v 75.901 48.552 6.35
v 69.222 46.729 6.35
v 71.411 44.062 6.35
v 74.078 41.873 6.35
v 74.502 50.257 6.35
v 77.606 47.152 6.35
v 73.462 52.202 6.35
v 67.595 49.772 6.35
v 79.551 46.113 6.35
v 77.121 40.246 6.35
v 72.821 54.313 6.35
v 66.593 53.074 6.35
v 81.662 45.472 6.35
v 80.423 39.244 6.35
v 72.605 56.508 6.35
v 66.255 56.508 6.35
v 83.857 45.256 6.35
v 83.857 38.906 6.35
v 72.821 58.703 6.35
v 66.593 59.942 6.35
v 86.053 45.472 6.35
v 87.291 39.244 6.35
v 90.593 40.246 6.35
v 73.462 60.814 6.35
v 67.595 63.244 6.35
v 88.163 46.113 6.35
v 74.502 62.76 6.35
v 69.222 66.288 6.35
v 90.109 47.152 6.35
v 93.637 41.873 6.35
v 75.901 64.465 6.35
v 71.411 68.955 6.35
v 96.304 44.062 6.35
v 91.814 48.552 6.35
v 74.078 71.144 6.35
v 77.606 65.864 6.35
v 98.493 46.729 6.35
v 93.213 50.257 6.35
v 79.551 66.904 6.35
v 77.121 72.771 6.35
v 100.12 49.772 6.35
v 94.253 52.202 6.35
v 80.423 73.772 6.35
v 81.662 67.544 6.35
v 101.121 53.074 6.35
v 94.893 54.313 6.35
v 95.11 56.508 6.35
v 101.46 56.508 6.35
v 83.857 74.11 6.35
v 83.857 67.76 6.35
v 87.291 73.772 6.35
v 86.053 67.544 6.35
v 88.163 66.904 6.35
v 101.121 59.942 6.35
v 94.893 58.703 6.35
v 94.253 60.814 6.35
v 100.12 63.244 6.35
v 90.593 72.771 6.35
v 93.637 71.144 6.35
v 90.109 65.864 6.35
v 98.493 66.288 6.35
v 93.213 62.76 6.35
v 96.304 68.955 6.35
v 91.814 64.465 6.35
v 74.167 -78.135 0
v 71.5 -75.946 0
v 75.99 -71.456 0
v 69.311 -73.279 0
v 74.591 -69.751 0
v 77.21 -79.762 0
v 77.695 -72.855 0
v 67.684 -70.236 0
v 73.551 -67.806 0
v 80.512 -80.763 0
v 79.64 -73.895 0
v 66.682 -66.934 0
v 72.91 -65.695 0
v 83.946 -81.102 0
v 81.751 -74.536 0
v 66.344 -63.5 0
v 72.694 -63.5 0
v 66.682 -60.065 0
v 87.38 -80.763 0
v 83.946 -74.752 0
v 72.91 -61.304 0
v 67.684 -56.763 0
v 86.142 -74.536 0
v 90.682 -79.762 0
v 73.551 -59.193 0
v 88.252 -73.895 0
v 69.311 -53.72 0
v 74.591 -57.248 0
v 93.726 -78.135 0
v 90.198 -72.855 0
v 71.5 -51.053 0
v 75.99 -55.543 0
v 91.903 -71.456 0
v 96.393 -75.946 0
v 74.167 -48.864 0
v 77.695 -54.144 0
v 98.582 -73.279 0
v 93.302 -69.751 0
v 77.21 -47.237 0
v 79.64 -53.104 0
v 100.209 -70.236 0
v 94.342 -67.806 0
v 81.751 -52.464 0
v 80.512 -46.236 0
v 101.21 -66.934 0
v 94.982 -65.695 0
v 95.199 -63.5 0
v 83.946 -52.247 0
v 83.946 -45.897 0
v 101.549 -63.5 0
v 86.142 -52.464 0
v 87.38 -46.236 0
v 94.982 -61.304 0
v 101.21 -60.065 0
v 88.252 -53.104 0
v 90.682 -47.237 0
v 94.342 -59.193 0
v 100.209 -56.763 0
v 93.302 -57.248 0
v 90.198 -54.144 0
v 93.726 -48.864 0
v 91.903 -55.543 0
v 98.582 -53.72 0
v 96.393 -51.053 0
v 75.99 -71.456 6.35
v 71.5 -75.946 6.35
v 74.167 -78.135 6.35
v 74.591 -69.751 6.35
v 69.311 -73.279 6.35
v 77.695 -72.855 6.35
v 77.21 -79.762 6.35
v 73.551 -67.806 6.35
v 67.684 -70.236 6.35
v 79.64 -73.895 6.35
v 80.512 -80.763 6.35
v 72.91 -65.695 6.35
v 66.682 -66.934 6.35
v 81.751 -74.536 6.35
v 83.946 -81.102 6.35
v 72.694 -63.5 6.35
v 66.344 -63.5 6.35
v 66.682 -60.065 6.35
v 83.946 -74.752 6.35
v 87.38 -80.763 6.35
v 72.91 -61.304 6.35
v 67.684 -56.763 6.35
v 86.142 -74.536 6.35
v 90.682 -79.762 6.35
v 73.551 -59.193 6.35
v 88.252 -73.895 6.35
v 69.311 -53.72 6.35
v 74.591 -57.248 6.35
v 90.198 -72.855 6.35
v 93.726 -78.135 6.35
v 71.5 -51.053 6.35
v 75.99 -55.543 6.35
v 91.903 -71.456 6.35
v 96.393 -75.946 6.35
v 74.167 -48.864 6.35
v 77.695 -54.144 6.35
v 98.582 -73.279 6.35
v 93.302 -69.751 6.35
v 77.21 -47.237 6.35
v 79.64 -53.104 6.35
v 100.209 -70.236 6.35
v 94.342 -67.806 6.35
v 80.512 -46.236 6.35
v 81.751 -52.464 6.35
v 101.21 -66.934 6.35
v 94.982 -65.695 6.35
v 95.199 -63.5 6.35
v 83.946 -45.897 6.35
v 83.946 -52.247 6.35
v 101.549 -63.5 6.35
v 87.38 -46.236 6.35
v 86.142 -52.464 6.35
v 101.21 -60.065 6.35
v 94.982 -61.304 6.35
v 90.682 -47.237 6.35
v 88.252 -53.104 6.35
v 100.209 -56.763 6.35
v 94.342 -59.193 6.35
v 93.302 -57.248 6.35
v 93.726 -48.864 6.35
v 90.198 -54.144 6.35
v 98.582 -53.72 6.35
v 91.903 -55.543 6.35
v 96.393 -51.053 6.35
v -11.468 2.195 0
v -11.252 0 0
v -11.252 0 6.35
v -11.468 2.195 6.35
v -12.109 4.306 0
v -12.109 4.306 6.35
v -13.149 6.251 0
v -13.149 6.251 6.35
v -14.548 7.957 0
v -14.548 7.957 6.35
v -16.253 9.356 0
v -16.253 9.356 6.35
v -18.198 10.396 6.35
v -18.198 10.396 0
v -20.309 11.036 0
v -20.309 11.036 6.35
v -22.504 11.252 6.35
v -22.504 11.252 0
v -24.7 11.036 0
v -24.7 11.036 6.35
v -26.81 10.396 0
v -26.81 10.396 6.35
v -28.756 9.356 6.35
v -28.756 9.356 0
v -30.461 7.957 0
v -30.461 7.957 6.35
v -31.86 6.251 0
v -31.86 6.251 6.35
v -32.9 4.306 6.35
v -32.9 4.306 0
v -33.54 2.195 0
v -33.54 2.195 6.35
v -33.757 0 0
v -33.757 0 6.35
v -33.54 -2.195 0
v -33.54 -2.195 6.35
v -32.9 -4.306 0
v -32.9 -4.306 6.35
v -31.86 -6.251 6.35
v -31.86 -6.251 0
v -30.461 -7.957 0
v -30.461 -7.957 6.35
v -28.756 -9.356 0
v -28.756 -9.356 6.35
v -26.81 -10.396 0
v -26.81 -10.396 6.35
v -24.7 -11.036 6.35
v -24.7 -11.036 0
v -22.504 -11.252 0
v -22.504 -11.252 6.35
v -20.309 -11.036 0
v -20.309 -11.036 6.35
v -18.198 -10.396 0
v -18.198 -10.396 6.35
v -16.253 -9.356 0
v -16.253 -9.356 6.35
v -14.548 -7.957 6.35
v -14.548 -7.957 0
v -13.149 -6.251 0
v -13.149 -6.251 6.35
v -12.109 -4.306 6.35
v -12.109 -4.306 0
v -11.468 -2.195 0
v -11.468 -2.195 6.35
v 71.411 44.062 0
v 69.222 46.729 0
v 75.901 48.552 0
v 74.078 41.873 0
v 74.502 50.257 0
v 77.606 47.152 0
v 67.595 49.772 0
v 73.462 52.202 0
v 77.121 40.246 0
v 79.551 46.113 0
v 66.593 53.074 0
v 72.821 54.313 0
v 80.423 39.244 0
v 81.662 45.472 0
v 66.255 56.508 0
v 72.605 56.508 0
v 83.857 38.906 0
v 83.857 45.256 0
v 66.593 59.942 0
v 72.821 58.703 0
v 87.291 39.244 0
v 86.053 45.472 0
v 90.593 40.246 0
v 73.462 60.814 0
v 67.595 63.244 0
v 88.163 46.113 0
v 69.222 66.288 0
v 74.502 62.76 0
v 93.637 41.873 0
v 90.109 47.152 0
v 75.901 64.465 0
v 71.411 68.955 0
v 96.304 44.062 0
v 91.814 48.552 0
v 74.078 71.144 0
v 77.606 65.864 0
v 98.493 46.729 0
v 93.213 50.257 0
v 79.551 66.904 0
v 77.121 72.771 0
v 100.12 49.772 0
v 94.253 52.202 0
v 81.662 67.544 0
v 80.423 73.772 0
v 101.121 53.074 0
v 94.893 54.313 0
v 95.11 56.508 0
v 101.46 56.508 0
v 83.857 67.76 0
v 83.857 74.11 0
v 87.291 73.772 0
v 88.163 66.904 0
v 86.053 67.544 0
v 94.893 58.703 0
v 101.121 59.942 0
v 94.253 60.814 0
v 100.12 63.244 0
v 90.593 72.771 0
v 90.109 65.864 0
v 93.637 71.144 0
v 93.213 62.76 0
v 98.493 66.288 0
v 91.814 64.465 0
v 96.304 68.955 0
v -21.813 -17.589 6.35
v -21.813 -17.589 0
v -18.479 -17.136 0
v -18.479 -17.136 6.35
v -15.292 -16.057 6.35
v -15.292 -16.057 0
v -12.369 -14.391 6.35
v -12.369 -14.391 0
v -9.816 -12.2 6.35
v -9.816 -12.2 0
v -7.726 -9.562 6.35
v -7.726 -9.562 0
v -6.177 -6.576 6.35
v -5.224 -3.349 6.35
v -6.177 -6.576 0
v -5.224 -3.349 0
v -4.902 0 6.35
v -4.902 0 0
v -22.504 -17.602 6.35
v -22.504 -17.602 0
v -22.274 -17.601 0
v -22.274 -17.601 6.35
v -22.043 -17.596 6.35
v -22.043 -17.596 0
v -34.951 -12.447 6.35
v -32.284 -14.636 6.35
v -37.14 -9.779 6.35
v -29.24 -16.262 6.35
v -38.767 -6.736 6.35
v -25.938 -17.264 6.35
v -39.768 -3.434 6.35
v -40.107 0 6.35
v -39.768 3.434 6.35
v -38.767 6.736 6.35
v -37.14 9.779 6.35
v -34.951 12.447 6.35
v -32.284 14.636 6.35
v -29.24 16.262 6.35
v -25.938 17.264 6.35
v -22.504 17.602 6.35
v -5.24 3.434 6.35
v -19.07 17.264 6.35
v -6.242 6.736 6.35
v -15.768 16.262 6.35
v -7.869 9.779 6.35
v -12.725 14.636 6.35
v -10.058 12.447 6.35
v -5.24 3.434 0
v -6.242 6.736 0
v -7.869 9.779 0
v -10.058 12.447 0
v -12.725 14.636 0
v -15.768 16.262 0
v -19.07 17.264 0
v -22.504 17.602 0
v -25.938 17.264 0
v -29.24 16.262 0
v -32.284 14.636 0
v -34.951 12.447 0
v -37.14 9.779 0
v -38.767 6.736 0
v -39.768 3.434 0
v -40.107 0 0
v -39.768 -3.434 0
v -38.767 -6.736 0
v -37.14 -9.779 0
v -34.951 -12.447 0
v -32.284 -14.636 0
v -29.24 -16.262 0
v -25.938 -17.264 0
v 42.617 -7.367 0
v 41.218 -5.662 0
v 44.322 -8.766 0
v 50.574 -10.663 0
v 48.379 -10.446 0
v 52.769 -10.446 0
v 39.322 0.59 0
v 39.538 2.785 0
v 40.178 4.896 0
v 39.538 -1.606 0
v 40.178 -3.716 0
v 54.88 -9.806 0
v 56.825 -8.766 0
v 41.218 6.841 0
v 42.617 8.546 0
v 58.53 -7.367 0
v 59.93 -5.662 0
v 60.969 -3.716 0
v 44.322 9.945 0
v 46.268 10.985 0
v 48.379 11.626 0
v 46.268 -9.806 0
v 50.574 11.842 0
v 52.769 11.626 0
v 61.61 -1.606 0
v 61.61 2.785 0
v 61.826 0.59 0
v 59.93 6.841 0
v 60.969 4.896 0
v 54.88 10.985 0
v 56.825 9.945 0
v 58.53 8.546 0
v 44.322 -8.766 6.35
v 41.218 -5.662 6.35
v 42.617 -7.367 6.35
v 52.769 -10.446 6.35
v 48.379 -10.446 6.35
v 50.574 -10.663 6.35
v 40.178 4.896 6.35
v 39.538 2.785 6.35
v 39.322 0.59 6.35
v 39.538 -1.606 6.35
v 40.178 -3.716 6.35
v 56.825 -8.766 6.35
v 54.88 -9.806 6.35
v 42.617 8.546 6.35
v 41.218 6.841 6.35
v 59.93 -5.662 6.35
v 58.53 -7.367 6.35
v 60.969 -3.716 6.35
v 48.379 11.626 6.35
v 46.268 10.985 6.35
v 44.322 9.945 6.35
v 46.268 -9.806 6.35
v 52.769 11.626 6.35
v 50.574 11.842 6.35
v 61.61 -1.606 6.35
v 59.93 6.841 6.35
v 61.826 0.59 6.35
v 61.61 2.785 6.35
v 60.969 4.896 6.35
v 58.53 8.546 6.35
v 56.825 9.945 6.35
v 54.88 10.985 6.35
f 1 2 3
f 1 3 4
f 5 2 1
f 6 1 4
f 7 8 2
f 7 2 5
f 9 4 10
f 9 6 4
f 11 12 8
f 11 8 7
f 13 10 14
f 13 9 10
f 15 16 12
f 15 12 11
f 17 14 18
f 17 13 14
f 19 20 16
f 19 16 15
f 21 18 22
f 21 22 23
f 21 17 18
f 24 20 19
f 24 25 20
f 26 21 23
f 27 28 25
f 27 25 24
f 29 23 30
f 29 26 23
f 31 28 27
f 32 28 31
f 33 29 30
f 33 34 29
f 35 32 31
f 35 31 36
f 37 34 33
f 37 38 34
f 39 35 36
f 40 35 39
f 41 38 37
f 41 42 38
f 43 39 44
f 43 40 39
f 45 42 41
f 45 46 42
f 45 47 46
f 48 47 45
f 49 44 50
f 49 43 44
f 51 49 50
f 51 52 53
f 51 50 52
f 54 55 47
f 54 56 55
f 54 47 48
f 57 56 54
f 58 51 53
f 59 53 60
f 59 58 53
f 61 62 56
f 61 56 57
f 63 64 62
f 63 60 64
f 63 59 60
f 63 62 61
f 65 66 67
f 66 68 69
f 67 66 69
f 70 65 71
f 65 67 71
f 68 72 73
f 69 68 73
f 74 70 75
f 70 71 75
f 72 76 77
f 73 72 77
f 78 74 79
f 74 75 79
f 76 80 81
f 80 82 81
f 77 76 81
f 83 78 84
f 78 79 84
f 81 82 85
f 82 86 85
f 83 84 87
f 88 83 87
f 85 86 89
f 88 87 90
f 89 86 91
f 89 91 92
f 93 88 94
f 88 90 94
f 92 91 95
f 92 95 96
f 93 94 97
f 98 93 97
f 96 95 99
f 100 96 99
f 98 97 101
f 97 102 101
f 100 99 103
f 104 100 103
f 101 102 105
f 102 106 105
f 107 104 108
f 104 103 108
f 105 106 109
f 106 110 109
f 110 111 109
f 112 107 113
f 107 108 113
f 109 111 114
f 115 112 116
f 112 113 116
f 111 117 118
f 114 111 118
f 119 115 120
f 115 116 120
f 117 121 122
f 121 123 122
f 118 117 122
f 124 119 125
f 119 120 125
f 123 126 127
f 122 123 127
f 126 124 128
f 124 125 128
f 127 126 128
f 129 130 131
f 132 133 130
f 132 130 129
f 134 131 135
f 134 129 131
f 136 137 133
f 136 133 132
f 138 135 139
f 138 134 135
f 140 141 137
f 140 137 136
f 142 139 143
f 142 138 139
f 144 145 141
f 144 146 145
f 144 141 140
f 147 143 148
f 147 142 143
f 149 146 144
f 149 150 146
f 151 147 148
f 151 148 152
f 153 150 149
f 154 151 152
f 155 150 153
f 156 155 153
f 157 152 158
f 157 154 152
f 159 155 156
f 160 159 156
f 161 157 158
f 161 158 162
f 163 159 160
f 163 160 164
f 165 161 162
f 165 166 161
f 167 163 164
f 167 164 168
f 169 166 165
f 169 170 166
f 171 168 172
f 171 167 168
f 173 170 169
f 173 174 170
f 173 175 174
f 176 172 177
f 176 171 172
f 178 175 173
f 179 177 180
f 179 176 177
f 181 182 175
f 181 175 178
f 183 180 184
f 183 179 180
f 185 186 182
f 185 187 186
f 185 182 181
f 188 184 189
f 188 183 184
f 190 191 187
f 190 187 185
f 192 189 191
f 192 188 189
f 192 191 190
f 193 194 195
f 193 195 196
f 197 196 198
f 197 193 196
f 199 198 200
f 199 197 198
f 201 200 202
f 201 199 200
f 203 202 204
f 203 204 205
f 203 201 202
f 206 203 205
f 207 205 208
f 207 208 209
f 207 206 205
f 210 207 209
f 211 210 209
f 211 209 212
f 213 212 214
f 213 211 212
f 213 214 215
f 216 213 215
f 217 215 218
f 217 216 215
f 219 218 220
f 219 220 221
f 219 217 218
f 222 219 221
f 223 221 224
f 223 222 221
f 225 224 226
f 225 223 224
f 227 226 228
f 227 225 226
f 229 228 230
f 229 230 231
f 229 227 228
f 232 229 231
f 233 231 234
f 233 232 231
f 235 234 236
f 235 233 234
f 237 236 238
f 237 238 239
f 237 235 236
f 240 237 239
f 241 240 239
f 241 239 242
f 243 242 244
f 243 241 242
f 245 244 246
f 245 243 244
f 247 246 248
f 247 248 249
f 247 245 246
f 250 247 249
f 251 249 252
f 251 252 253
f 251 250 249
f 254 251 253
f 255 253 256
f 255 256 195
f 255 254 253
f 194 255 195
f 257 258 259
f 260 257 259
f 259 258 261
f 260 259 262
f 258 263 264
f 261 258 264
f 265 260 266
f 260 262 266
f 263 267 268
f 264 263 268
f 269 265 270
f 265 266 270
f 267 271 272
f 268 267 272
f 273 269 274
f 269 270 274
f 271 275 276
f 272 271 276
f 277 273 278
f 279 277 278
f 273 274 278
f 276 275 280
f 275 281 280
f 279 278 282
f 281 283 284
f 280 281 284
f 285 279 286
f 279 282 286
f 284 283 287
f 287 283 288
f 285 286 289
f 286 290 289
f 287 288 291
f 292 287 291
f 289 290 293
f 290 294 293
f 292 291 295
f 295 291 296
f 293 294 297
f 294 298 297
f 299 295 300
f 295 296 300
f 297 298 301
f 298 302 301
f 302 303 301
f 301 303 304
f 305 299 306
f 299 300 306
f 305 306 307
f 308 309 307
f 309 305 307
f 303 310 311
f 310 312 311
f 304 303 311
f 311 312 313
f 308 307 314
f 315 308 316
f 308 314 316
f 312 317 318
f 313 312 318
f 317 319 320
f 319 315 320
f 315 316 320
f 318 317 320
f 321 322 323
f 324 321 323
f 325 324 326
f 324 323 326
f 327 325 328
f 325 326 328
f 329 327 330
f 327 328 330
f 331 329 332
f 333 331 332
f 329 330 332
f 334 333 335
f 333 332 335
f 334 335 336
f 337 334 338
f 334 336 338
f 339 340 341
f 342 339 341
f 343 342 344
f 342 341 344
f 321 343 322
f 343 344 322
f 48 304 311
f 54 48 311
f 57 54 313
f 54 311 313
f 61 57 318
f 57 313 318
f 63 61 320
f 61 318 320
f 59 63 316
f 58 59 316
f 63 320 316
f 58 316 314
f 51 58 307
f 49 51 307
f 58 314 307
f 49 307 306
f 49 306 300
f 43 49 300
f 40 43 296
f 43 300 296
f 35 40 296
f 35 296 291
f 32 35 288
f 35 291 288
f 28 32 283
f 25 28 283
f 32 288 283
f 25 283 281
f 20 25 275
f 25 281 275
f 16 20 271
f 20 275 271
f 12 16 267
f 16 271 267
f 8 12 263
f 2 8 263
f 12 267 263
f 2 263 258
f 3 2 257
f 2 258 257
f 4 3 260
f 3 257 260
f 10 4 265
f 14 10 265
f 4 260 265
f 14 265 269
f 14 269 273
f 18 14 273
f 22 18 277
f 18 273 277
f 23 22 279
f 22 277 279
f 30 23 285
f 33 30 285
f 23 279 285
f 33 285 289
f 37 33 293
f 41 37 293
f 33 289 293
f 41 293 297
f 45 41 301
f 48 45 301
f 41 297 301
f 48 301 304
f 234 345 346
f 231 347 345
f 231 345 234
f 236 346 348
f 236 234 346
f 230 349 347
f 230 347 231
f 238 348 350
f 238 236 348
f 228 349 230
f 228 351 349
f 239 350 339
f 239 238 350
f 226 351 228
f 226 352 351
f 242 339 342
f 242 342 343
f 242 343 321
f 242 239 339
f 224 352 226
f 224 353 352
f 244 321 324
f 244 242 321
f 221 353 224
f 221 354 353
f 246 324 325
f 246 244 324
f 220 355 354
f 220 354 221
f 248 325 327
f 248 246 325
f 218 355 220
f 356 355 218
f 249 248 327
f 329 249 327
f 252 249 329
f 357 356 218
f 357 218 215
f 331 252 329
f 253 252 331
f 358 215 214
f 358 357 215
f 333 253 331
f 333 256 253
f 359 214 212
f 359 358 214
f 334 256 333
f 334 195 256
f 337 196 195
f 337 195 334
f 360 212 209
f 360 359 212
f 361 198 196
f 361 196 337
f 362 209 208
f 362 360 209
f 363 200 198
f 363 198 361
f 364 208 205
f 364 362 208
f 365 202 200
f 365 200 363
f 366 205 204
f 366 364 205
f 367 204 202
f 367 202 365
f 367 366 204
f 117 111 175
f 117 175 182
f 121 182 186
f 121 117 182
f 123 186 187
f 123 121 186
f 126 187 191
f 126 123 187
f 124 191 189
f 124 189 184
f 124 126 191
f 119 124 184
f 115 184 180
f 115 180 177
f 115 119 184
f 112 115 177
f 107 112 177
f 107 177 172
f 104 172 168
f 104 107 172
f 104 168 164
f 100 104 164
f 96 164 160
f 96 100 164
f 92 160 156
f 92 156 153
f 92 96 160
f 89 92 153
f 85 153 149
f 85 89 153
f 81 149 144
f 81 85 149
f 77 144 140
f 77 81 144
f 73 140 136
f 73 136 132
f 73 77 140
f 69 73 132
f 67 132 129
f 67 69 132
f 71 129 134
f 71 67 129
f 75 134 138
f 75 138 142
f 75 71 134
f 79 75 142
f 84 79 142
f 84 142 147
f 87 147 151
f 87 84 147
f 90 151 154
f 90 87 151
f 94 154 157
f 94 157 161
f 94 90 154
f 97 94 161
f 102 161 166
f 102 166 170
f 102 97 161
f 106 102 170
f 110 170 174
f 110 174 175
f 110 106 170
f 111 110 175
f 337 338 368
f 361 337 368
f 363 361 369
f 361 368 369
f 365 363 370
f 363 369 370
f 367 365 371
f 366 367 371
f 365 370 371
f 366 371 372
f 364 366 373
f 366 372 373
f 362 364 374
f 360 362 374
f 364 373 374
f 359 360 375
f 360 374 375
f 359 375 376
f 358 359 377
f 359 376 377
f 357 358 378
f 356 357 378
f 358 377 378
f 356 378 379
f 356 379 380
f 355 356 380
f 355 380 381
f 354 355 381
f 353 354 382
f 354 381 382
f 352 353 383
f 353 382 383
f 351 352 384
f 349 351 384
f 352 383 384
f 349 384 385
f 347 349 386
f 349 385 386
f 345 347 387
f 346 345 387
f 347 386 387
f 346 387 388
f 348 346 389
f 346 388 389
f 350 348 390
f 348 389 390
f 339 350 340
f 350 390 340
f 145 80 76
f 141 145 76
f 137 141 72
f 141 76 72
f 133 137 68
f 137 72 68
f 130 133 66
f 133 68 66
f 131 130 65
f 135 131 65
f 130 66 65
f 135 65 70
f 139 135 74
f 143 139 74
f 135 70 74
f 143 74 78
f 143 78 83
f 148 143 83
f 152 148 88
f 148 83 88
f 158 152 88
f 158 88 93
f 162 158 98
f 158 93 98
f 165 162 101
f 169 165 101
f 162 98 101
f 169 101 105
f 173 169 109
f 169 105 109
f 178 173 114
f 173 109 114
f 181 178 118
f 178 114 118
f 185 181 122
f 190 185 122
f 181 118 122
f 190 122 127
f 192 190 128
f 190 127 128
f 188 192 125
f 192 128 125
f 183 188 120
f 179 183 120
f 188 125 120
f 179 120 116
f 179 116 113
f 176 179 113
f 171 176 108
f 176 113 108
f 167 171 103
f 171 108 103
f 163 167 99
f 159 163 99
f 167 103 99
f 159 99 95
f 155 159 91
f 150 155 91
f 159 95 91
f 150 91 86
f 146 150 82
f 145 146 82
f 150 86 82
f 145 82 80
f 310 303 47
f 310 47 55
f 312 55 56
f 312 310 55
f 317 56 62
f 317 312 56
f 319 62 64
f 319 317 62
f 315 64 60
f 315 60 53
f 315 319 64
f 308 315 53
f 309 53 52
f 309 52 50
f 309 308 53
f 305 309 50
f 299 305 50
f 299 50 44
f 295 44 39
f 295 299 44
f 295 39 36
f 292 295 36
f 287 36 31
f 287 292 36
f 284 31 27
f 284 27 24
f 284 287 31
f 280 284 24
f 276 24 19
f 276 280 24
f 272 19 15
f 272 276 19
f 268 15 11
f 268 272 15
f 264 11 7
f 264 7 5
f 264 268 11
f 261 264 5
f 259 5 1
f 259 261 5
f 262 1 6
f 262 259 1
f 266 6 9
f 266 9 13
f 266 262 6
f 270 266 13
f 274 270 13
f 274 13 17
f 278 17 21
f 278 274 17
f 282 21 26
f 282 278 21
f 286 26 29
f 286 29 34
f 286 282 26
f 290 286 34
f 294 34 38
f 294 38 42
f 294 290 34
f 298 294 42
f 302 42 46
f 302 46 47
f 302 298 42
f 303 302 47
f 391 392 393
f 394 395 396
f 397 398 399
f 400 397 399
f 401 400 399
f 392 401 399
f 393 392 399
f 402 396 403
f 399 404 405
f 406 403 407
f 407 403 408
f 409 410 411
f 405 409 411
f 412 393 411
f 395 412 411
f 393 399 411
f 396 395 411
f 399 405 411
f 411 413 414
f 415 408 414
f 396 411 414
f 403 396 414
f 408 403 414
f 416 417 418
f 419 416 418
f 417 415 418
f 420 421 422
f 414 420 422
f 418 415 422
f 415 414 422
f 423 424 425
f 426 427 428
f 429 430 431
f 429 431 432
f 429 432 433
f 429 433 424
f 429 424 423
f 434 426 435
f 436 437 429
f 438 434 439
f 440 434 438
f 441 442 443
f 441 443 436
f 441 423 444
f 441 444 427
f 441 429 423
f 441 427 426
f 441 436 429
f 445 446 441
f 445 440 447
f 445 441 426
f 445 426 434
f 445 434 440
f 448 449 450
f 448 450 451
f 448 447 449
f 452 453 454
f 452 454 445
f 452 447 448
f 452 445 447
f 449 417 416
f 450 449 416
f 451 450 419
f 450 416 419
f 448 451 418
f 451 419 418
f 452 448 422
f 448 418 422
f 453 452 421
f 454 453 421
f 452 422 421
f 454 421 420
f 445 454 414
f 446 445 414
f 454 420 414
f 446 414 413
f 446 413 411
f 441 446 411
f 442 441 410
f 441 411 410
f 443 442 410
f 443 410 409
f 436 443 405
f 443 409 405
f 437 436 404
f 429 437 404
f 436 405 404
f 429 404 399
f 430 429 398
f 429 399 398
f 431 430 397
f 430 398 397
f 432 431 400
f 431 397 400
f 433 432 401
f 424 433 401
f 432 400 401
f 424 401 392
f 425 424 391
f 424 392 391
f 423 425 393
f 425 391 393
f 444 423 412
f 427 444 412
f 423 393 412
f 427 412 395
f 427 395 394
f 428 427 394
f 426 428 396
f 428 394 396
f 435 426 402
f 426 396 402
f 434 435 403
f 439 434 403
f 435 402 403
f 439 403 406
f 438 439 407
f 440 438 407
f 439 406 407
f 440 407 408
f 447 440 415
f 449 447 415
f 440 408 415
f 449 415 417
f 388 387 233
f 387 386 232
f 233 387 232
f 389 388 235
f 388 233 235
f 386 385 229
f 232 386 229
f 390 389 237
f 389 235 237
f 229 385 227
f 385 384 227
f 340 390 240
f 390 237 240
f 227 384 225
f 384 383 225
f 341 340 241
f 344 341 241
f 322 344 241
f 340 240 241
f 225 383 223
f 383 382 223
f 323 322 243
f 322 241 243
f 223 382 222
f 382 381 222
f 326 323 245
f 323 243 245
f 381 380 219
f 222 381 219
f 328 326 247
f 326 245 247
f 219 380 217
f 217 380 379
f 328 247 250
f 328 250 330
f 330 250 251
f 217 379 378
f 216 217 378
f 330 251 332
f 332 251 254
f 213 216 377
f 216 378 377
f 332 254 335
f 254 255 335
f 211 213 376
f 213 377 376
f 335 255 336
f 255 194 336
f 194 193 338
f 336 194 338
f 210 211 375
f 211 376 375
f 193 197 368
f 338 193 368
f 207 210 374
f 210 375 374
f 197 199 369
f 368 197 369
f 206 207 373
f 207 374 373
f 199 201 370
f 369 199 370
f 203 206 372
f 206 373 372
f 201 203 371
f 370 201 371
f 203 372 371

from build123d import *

# Parameters (mm, degrees)
F0_R     = 11.2522
F0_R_2   = 17.6022
F1_DEPTH = 6.35


with BuildPart() as f1:
    # F0 (on Top) → F1 (new body)
    with BuildSketch(Plane.XY):
        with Locations((50.573707, 0.589635)):
            Circle(F0_R)
        with BuildLine():
            ThreePointArc((-21.812574, -17.588599), (-9.815525, -12.199586), (-4.9022, 0))
            ThreePointArc((-4.9022, 0), (-34.951035, 12.446635), (-22.5044, -17.6022))
            ThreePointArc((-22.5044, -17.6022), (-22.158498, -17.594826), (-21.812574, -17.588599))
        make_face()
        with Locations((-22.5044, 0)):
            Circle(F0_R, mode=Mode.SUBTRACT)
        with BuildLine():
            ThreePointArc((101.548586, -63.499517), (83.946386, -45.897317), (66.344186, -63.499517))
            ThreePointArc((66.344186, -63.499517), (83.946386, -81.101717), (101.548586, -63.499517))
        make_face()
        with Locations((83.946386, -63.499517)):
            Circle(F0_R, mode=Mode.SUBTRACT)
        with BuildLine():
            ThreePointArc((-21.812574, -17.588599), (-22.158498, -17.594826), (-22.5044, -17.6022))
            ThreePointArc((-22.5044, -17.6022), (-22.15842, -17.598799), (-21.812574, -17.588599))
        make_face()
        with Locations((83.857372, 56.5083)):
            Circle(F0_R_2)
        with Locations((83.857372, 56.5083)):
            Circle(F0_R, mode=Mode.SUBTRACT)
    extrude(amount=F1_DEPTH)


solid = f1.part
